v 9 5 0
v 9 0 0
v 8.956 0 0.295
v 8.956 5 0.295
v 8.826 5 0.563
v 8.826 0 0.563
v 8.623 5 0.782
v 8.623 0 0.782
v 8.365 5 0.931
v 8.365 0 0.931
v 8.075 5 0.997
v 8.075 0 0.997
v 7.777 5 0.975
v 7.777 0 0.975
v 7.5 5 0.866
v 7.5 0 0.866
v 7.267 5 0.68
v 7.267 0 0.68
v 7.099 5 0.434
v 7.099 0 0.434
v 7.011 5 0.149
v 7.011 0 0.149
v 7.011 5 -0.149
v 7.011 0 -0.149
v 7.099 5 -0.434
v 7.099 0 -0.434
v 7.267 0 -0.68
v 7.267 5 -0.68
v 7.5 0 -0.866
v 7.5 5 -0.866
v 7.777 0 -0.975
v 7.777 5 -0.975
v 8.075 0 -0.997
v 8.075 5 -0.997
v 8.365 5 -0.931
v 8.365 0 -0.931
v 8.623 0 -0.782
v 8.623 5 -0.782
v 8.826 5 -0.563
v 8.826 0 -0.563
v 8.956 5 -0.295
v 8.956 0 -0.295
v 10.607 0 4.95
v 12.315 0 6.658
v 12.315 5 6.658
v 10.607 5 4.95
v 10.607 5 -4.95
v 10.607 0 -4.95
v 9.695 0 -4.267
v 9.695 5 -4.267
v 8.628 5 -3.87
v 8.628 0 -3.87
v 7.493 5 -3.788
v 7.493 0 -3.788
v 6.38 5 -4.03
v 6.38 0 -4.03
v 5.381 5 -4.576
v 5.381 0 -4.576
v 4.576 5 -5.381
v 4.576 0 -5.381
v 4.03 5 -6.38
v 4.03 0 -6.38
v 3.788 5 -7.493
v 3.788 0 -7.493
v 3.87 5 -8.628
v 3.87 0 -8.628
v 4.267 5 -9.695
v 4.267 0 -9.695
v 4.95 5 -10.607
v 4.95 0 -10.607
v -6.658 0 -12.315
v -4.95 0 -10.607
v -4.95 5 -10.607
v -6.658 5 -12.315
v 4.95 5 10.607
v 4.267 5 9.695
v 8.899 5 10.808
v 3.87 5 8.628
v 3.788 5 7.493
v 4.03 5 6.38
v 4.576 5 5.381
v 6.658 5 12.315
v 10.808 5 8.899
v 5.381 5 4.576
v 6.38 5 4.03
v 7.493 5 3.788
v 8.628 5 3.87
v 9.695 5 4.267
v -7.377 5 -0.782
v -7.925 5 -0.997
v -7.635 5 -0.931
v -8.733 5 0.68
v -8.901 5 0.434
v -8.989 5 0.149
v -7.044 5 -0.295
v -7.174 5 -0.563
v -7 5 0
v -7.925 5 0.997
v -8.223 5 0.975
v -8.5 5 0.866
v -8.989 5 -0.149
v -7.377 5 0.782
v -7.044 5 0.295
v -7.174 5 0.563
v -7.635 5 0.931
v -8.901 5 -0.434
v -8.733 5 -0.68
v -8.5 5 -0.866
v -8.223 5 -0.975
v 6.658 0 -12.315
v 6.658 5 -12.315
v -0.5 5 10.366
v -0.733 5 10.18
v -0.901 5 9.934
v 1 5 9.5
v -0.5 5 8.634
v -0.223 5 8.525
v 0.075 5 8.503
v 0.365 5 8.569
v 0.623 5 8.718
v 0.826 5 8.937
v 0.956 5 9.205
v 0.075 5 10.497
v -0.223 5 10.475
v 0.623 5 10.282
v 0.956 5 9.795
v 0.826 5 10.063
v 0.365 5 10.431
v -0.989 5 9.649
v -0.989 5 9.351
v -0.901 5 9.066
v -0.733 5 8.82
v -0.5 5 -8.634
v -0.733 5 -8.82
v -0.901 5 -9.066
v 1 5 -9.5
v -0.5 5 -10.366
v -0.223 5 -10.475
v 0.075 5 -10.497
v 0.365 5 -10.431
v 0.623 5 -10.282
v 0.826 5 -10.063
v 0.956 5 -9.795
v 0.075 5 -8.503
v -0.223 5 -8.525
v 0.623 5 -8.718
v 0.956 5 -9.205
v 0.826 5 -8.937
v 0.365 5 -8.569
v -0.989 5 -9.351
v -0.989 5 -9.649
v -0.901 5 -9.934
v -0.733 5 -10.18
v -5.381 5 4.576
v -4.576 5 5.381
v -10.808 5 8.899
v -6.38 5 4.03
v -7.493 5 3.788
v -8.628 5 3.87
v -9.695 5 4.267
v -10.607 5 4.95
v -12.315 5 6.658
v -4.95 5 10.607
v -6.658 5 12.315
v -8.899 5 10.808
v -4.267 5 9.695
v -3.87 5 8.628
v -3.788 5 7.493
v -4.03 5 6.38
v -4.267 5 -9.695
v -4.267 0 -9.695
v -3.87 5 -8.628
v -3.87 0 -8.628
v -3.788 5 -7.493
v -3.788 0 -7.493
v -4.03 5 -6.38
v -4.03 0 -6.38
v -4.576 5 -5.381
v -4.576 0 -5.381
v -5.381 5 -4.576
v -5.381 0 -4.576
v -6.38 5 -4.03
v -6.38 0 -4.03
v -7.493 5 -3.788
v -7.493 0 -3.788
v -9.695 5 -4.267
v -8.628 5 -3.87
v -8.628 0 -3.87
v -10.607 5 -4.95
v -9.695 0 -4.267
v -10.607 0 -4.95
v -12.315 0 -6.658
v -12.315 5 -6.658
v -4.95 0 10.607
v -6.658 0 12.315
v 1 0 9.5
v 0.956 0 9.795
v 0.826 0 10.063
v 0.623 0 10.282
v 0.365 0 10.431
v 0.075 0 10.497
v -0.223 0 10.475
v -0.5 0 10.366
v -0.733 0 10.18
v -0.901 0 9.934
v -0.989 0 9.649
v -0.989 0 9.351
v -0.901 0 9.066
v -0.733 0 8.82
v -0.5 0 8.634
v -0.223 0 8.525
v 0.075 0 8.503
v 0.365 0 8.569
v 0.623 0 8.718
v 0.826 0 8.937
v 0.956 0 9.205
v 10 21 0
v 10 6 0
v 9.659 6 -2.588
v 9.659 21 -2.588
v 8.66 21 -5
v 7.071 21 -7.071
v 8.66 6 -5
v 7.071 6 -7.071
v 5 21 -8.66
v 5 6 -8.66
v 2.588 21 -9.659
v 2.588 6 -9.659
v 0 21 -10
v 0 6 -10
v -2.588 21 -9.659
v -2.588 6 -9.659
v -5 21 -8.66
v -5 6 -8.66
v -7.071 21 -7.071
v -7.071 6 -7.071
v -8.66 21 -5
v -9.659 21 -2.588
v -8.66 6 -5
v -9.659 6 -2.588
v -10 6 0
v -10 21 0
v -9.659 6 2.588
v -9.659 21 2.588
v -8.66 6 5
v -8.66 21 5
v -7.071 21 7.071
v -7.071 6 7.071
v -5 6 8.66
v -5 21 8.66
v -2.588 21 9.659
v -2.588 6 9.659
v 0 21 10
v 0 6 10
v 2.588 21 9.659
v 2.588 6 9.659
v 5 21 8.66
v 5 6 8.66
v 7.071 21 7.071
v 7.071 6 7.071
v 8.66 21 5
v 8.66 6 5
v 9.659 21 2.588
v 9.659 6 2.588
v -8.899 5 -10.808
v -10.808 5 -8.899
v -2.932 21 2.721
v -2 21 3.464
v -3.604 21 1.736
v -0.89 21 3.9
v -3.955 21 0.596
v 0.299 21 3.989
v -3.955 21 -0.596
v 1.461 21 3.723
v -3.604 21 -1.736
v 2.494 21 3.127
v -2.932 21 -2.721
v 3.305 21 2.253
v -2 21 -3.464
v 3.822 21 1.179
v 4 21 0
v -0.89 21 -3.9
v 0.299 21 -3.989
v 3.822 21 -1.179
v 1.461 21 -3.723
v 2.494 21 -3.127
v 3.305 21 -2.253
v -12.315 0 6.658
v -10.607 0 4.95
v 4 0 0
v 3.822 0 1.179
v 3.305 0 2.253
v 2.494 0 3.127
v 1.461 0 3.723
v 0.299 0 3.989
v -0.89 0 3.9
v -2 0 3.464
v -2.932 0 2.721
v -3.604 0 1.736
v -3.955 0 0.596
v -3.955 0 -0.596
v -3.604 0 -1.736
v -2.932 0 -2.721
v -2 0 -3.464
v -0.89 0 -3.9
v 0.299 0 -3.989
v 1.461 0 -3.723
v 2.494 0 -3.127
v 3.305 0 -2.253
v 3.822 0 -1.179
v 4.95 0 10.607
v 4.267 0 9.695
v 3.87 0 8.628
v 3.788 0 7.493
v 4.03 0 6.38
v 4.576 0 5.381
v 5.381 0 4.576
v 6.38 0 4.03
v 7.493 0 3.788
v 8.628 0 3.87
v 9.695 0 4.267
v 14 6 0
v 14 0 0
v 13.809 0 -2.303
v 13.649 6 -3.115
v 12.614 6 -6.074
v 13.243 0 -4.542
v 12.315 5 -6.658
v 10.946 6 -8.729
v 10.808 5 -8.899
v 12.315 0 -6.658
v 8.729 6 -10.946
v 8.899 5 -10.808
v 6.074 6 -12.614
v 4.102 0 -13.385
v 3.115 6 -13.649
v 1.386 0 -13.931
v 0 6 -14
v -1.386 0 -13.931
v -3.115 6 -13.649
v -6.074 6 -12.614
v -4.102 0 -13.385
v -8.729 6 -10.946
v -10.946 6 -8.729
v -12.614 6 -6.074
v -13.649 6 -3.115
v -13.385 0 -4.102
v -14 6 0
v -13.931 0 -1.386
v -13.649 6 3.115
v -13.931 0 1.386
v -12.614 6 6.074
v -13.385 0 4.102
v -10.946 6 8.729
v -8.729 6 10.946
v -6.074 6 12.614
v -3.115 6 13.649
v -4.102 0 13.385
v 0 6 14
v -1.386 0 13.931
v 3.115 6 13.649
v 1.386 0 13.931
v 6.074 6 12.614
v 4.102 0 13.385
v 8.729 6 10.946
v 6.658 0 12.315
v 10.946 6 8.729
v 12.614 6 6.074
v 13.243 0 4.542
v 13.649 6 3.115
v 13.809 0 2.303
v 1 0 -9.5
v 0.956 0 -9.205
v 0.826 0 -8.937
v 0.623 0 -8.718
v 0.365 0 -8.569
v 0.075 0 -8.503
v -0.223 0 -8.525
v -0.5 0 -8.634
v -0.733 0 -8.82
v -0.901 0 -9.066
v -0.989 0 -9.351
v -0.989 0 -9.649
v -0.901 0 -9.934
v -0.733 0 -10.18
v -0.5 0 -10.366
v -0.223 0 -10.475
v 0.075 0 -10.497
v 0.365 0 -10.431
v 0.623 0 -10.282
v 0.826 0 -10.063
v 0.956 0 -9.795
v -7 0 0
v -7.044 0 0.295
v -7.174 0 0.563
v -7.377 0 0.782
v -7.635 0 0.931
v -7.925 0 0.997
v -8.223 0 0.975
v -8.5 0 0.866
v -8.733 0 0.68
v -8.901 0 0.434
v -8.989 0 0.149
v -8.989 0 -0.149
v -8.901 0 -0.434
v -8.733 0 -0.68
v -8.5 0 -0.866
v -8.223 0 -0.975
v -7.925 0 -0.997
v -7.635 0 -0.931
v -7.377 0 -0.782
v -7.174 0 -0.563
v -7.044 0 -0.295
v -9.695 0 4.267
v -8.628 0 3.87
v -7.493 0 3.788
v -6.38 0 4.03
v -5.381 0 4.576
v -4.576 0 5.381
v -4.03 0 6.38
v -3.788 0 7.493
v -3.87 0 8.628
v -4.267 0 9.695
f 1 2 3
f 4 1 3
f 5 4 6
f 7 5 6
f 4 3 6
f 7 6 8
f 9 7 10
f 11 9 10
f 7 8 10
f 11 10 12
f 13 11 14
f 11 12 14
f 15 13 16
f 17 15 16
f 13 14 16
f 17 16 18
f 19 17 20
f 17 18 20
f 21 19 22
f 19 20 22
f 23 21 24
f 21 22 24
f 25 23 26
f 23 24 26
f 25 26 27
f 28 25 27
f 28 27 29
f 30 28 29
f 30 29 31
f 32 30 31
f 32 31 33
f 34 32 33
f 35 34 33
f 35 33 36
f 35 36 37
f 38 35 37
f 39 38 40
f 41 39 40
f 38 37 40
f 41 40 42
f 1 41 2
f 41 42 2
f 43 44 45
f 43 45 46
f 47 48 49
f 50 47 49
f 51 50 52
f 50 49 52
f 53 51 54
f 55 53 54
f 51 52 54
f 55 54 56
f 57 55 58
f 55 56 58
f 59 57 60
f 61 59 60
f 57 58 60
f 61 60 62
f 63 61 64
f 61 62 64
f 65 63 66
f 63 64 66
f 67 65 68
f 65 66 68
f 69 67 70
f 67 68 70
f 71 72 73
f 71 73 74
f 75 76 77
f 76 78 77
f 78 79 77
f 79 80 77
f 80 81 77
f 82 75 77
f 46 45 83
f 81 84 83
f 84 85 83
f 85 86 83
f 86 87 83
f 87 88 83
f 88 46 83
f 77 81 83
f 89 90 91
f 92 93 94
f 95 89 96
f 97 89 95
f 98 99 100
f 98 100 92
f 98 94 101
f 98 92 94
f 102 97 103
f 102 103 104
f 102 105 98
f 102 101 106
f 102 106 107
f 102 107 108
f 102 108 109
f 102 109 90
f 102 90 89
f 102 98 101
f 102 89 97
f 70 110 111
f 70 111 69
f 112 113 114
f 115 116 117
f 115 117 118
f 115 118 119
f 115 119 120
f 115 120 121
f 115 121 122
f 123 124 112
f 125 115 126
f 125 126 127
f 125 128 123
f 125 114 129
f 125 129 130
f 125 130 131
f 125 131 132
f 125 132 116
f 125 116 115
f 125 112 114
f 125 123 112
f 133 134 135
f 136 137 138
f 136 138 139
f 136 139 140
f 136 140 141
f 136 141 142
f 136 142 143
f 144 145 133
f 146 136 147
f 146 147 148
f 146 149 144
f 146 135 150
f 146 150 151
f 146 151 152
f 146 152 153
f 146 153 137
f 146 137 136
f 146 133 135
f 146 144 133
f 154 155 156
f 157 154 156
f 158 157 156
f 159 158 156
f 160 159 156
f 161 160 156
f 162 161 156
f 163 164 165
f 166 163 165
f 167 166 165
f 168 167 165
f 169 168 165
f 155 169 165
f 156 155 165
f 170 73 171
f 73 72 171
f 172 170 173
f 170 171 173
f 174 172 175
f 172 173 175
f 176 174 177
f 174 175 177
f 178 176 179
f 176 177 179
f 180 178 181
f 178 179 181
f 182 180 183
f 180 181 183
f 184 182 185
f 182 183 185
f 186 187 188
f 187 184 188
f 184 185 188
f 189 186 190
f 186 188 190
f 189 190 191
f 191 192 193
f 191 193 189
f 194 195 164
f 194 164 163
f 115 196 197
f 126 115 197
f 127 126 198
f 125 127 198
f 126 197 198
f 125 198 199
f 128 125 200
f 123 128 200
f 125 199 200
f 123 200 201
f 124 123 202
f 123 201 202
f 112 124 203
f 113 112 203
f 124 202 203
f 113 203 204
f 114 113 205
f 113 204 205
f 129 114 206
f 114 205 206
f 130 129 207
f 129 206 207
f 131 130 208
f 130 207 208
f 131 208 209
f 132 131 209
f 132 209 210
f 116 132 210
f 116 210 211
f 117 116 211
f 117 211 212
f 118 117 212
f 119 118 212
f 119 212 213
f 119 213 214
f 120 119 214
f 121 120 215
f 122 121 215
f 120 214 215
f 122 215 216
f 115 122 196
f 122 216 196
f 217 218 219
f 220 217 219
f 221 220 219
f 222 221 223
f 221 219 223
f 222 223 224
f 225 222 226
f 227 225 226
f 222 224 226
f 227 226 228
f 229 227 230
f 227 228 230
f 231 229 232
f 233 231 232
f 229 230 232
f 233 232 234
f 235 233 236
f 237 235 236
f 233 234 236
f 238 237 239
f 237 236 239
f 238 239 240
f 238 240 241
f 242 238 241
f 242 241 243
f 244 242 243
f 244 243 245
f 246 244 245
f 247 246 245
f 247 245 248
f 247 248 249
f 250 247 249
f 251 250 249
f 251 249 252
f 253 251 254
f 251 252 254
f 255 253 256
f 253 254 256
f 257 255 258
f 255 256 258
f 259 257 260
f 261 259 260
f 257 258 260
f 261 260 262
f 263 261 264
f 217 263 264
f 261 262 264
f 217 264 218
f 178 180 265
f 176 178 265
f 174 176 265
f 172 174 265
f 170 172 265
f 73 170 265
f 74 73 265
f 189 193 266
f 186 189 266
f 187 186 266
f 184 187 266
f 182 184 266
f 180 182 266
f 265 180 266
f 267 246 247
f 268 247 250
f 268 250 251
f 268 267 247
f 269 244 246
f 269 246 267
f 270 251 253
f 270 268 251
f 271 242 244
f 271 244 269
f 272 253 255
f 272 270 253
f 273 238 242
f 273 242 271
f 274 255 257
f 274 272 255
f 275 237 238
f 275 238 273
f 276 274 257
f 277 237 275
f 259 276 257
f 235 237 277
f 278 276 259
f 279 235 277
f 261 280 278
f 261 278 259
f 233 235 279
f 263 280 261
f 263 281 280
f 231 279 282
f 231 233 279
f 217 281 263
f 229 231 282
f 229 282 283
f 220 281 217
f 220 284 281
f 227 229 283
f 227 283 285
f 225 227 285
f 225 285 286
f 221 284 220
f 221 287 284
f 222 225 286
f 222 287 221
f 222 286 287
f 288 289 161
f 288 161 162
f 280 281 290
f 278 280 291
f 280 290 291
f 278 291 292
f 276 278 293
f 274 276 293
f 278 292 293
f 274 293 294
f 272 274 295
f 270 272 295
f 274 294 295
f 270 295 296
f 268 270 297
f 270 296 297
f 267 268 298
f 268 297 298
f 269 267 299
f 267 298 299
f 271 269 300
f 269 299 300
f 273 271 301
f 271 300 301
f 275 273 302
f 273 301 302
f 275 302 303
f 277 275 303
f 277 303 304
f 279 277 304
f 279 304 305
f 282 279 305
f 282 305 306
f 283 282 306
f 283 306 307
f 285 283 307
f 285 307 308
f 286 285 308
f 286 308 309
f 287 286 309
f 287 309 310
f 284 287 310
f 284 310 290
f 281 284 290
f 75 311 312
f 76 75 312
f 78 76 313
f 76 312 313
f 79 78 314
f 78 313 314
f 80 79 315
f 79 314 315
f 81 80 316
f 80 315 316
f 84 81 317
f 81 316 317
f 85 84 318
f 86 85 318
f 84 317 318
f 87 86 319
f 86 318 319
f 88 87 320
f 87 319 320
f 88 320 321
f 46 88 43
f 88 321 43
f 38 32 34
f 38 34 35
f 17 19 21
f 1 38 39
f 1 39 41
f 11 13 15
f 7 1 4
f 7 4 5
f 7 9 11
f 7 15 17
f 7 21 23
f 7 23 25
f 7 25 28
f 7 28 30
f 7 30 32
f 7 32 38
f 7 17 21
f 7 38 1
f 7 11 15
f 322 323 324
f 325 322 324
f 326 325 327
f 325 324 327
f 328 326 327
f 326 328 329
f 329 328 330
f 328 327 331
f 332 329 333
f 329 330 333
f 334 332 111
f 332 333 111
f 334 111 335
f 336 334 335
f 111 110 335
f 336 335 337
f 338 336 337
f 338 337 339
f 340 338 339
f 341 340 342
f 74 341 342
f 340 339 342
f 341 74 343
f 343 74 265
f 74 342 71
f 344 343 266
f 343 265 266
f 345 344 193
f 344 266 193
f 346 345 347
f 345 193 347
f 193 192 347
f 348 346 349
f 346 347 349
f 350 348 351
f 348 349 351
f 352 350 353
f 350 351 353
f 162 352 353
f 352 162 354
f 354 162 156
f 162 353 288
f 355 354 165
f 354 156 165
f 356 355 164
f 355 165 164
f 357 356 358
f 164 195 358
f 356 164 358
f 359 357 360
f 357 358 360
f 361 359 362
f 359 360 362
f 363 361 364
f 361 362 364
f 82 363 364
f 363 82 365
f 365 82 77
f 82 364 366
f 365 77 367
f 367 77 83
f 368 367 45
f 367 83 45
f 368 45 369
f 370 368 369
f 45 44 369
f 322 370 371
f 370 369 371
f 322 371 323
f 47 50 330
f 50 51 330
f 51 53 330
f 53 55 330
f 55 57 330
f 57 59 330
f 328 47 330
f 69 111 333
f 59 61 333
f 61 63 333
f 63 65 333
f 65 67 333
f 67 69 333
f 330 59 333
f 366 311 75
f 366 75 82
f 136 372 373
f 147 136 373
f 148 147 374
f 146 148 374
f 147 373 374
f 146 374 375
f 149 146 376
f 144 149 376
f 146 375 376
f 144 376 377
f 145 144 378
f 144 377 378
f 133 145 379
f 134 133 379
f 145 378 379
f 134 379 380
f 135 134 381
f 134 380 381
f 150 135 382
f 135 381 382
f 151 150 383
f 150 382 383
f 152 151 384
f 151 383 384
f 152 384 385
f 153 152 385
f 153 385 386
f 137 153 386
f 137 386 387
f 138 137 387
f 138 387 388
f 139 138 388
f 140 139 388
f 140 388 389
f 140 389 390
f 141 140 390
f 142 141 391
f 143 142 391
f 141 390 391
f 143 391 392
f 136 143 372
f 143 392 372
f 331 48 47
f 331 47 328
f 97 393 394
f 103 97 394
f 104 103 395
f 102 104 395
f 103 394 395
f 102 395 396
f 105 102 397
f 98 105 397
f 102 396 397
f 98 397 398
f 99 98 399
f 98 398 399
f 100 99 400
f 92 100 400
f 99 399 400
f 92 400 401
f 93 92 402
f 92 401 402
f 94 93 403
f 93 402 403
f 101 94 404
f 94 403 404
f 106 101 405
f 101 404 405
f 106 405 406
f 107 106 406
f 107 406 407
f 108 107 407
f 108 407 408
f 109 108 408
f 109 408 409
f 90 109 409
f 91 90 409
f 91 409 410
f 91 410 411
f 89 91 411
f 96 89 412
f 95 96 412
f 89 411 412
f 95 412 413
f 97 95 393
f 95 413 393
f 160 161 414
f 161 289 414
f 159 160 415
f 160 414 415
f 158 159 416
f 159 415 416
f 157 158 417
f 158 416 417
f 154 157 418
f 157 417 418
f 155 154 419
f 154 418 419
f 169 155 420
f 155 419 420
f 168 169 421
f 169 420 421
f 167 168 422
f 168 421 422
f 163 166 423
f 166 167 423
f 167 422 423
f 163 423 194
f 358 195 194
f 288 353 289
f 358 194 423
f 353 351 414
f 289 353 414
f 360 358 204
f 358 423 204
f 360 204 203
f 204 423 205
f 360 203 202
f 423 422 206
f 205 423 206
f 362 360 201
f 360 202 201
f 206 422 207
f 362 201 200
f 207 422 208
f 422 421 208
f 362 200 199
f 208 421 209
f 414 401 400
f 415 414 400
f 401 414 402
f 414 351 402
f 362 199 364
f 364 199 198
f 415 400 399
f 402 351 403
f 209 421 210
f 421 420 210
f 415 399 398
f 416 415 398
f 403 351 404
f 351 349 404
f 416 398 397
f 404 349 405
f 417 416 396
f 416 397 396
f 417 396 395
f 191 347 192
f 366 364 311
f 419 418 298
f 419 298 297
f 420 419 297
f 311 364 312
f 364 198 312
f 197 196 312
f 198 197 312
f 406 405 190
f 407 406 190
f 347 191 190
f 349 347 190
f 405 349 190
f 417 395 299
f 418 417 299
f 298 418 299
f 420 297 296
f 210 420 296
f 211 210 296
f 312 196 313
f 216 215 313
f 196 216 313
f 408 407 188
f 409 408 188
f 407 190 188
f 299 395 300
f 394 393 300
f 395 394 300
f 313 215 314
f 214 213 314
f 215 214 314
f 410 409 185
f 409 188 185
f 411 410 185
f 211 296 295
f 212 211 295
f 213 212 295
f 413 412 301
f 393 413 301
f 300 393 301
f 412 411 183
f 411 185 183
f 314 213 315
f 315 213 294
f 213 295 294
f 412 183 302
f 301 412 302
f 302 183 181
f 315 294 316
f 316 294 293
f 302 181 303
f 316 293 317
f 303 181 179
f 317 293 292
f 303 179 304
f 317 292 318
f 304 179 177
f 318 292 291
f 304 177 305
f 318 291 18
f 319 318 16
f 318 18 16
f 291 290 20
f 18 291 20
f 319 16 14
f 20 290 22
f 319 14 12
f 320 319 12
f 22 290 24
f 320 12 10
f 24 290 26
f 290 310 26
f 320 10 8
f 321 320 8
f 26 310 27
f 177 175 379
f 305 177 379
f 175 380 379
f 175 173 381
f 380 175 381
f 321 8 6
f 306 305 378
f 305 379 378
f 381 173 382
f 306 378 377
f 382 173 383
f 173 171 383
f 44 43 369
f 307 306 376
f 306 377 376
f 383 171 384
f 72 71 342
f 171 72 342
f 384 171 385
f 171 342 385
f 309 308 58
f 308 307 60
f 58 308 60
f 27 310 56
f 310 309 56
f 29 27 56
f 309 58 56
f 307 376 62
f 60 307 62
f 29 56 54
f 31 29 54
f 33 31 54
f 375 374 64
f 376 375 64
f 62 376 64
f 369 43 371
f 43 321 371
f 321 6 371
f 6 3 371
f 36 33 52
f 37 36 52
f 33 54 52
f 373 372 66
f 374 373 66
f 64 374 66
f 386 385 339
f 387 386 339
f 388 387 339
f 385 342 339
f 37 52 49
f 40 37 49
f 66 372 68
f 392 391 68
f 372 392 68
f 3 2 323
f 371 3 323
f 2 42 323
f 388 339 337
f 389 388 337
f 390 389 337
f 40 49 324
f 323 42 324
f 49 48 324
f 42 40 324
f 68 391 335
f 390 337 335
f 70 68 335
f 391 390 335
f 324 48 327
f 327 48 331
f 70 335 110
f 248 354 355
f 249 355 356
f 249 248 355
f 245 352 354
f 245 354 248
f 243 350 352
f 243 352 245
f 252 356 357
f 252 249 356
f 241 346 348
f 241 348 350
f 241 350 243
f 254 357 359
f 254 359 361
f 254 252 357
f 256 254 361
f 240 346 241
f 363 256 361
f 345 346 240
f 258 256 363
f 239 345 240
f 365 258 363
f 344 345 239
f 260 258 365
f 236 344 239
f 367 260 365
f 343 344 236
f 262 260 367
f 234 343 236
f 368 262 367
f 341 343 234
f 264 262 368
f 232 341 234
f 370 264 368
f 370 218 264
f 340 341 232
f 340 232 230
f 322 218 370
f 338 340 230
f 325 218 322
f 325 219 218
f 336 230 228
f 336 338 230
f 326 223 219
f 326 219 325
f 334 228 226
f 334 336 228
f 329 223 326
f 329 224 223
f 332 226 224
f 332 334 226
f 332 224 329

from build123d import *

# Parameters (mm, degrees)
SKETCH_1_R               = 14
EXTRUDE_1_DEPTH          = 6
SKETCH_2_R               = 10
EXTRUDE_2_DEPTH          = 15
SKETCH_3_R               = 1
SKETCH_3_R_2             = 4
CUT_EXTRUDE_1_DEPTH      = 5
CUT_EXTRUDE_2_DEPTH      = 5
PATTERN_CIRCULAR_1_COUNT = 4
SKETCH_5_R               = 4
CUT_EXTRUDE_3_DEPTH      = 22


with BuildPart() as part:
    # Эскиз1 → Бобышка-Вытянуть1 (new body)
    with BuildSketch(Plane(origin=(0, 0, 0), x_dir=(1, 0, 0), z_dir=(0, 1, 0))):
        Circle(SKETCH_1_R)
    extrude(amount=EXTRUDE_1_DEPTH)

    # Эскиз2 → Бобышка-Вытянуть2 (add)
    with BuildSketch(Plane(origin=(0, 6, 0), x_dir=(1, 0, 0), z_dir=(0, 1, 0))):
        Circle(SKETCH_2_R)
    extrude(amount=EXTRUDE_2_DEPTH)

    # Эскиз3 → Вырез-Вытянуть1 (cut)
    with BuildSketch(Plane.XZ):
        with Locations((-8, 0)):
            Circle(SKETCH_3_R)
        with Locations((8, 0)):
            Circle(SKETCH_3_R)
        with Locations((0, 9.5)):
            Circle(SKETCH_3_R)
        with Locations((0, -9.5)):
            Circle(SKETCH_3_R)
        with Locations((-7.778174593, 7.778174593)):
            Circle(SKETCH_3_R_2)
        with Locations((7.778174593, 7.778174593)):
            Circle(SKETCH_3_R_2)
        with Locations((7.778174593, -7.778174593)):
            Circle(SKETCH_3_R_2)
        with Locations((-7.778174593, -7.778174593)):
            Circle(SKETCH_3_R_2)
    extrude(amount=-CUT_EXTRUDE_1_DEPTH, mode=Mode.SUBTRACT)

    # Эскиз4 → Вырез-Вытянуть2 (cut)
    with BuildSketch(Plane.XZ):
        Polygon((-4.949747468, 10.606601718), (-10.606601718, 4.949747468), (-15.333238313, 9.676384064), (-9.676384064, 15.333238313), align=None)
    cut_extrude_2 = extrude(amount=-CUT_EXTRUDE_2_DEPTH, mode=Mode.SUBTRACT)

    # Круговой массив1: Вырез-Вытянуть2 ×4 about axis
    pattern_circular_1_axis = Axis((0, 0, 0), (0, 1, 0))
    for i in range(1, PATTERN_CIRCULAR_1_COUNT):
        add(cut_extrude_2.rotate(pattern_circular_1_axis, i * 360 / PATTERN_CIRCULAR_1_COUNT), mode=Mode.SUBTRACT)

    # Эскиз5 → Вырез-Вытянуть3 (cut, through all)
    with BuildSketch(Plane.XZ):
        Circle(SKETCH_5_R)
    extrude(amount=-CUT_EXTRUDE_3_DEPTH, mode=Mode.SUBTRACT)


solid = part.part
